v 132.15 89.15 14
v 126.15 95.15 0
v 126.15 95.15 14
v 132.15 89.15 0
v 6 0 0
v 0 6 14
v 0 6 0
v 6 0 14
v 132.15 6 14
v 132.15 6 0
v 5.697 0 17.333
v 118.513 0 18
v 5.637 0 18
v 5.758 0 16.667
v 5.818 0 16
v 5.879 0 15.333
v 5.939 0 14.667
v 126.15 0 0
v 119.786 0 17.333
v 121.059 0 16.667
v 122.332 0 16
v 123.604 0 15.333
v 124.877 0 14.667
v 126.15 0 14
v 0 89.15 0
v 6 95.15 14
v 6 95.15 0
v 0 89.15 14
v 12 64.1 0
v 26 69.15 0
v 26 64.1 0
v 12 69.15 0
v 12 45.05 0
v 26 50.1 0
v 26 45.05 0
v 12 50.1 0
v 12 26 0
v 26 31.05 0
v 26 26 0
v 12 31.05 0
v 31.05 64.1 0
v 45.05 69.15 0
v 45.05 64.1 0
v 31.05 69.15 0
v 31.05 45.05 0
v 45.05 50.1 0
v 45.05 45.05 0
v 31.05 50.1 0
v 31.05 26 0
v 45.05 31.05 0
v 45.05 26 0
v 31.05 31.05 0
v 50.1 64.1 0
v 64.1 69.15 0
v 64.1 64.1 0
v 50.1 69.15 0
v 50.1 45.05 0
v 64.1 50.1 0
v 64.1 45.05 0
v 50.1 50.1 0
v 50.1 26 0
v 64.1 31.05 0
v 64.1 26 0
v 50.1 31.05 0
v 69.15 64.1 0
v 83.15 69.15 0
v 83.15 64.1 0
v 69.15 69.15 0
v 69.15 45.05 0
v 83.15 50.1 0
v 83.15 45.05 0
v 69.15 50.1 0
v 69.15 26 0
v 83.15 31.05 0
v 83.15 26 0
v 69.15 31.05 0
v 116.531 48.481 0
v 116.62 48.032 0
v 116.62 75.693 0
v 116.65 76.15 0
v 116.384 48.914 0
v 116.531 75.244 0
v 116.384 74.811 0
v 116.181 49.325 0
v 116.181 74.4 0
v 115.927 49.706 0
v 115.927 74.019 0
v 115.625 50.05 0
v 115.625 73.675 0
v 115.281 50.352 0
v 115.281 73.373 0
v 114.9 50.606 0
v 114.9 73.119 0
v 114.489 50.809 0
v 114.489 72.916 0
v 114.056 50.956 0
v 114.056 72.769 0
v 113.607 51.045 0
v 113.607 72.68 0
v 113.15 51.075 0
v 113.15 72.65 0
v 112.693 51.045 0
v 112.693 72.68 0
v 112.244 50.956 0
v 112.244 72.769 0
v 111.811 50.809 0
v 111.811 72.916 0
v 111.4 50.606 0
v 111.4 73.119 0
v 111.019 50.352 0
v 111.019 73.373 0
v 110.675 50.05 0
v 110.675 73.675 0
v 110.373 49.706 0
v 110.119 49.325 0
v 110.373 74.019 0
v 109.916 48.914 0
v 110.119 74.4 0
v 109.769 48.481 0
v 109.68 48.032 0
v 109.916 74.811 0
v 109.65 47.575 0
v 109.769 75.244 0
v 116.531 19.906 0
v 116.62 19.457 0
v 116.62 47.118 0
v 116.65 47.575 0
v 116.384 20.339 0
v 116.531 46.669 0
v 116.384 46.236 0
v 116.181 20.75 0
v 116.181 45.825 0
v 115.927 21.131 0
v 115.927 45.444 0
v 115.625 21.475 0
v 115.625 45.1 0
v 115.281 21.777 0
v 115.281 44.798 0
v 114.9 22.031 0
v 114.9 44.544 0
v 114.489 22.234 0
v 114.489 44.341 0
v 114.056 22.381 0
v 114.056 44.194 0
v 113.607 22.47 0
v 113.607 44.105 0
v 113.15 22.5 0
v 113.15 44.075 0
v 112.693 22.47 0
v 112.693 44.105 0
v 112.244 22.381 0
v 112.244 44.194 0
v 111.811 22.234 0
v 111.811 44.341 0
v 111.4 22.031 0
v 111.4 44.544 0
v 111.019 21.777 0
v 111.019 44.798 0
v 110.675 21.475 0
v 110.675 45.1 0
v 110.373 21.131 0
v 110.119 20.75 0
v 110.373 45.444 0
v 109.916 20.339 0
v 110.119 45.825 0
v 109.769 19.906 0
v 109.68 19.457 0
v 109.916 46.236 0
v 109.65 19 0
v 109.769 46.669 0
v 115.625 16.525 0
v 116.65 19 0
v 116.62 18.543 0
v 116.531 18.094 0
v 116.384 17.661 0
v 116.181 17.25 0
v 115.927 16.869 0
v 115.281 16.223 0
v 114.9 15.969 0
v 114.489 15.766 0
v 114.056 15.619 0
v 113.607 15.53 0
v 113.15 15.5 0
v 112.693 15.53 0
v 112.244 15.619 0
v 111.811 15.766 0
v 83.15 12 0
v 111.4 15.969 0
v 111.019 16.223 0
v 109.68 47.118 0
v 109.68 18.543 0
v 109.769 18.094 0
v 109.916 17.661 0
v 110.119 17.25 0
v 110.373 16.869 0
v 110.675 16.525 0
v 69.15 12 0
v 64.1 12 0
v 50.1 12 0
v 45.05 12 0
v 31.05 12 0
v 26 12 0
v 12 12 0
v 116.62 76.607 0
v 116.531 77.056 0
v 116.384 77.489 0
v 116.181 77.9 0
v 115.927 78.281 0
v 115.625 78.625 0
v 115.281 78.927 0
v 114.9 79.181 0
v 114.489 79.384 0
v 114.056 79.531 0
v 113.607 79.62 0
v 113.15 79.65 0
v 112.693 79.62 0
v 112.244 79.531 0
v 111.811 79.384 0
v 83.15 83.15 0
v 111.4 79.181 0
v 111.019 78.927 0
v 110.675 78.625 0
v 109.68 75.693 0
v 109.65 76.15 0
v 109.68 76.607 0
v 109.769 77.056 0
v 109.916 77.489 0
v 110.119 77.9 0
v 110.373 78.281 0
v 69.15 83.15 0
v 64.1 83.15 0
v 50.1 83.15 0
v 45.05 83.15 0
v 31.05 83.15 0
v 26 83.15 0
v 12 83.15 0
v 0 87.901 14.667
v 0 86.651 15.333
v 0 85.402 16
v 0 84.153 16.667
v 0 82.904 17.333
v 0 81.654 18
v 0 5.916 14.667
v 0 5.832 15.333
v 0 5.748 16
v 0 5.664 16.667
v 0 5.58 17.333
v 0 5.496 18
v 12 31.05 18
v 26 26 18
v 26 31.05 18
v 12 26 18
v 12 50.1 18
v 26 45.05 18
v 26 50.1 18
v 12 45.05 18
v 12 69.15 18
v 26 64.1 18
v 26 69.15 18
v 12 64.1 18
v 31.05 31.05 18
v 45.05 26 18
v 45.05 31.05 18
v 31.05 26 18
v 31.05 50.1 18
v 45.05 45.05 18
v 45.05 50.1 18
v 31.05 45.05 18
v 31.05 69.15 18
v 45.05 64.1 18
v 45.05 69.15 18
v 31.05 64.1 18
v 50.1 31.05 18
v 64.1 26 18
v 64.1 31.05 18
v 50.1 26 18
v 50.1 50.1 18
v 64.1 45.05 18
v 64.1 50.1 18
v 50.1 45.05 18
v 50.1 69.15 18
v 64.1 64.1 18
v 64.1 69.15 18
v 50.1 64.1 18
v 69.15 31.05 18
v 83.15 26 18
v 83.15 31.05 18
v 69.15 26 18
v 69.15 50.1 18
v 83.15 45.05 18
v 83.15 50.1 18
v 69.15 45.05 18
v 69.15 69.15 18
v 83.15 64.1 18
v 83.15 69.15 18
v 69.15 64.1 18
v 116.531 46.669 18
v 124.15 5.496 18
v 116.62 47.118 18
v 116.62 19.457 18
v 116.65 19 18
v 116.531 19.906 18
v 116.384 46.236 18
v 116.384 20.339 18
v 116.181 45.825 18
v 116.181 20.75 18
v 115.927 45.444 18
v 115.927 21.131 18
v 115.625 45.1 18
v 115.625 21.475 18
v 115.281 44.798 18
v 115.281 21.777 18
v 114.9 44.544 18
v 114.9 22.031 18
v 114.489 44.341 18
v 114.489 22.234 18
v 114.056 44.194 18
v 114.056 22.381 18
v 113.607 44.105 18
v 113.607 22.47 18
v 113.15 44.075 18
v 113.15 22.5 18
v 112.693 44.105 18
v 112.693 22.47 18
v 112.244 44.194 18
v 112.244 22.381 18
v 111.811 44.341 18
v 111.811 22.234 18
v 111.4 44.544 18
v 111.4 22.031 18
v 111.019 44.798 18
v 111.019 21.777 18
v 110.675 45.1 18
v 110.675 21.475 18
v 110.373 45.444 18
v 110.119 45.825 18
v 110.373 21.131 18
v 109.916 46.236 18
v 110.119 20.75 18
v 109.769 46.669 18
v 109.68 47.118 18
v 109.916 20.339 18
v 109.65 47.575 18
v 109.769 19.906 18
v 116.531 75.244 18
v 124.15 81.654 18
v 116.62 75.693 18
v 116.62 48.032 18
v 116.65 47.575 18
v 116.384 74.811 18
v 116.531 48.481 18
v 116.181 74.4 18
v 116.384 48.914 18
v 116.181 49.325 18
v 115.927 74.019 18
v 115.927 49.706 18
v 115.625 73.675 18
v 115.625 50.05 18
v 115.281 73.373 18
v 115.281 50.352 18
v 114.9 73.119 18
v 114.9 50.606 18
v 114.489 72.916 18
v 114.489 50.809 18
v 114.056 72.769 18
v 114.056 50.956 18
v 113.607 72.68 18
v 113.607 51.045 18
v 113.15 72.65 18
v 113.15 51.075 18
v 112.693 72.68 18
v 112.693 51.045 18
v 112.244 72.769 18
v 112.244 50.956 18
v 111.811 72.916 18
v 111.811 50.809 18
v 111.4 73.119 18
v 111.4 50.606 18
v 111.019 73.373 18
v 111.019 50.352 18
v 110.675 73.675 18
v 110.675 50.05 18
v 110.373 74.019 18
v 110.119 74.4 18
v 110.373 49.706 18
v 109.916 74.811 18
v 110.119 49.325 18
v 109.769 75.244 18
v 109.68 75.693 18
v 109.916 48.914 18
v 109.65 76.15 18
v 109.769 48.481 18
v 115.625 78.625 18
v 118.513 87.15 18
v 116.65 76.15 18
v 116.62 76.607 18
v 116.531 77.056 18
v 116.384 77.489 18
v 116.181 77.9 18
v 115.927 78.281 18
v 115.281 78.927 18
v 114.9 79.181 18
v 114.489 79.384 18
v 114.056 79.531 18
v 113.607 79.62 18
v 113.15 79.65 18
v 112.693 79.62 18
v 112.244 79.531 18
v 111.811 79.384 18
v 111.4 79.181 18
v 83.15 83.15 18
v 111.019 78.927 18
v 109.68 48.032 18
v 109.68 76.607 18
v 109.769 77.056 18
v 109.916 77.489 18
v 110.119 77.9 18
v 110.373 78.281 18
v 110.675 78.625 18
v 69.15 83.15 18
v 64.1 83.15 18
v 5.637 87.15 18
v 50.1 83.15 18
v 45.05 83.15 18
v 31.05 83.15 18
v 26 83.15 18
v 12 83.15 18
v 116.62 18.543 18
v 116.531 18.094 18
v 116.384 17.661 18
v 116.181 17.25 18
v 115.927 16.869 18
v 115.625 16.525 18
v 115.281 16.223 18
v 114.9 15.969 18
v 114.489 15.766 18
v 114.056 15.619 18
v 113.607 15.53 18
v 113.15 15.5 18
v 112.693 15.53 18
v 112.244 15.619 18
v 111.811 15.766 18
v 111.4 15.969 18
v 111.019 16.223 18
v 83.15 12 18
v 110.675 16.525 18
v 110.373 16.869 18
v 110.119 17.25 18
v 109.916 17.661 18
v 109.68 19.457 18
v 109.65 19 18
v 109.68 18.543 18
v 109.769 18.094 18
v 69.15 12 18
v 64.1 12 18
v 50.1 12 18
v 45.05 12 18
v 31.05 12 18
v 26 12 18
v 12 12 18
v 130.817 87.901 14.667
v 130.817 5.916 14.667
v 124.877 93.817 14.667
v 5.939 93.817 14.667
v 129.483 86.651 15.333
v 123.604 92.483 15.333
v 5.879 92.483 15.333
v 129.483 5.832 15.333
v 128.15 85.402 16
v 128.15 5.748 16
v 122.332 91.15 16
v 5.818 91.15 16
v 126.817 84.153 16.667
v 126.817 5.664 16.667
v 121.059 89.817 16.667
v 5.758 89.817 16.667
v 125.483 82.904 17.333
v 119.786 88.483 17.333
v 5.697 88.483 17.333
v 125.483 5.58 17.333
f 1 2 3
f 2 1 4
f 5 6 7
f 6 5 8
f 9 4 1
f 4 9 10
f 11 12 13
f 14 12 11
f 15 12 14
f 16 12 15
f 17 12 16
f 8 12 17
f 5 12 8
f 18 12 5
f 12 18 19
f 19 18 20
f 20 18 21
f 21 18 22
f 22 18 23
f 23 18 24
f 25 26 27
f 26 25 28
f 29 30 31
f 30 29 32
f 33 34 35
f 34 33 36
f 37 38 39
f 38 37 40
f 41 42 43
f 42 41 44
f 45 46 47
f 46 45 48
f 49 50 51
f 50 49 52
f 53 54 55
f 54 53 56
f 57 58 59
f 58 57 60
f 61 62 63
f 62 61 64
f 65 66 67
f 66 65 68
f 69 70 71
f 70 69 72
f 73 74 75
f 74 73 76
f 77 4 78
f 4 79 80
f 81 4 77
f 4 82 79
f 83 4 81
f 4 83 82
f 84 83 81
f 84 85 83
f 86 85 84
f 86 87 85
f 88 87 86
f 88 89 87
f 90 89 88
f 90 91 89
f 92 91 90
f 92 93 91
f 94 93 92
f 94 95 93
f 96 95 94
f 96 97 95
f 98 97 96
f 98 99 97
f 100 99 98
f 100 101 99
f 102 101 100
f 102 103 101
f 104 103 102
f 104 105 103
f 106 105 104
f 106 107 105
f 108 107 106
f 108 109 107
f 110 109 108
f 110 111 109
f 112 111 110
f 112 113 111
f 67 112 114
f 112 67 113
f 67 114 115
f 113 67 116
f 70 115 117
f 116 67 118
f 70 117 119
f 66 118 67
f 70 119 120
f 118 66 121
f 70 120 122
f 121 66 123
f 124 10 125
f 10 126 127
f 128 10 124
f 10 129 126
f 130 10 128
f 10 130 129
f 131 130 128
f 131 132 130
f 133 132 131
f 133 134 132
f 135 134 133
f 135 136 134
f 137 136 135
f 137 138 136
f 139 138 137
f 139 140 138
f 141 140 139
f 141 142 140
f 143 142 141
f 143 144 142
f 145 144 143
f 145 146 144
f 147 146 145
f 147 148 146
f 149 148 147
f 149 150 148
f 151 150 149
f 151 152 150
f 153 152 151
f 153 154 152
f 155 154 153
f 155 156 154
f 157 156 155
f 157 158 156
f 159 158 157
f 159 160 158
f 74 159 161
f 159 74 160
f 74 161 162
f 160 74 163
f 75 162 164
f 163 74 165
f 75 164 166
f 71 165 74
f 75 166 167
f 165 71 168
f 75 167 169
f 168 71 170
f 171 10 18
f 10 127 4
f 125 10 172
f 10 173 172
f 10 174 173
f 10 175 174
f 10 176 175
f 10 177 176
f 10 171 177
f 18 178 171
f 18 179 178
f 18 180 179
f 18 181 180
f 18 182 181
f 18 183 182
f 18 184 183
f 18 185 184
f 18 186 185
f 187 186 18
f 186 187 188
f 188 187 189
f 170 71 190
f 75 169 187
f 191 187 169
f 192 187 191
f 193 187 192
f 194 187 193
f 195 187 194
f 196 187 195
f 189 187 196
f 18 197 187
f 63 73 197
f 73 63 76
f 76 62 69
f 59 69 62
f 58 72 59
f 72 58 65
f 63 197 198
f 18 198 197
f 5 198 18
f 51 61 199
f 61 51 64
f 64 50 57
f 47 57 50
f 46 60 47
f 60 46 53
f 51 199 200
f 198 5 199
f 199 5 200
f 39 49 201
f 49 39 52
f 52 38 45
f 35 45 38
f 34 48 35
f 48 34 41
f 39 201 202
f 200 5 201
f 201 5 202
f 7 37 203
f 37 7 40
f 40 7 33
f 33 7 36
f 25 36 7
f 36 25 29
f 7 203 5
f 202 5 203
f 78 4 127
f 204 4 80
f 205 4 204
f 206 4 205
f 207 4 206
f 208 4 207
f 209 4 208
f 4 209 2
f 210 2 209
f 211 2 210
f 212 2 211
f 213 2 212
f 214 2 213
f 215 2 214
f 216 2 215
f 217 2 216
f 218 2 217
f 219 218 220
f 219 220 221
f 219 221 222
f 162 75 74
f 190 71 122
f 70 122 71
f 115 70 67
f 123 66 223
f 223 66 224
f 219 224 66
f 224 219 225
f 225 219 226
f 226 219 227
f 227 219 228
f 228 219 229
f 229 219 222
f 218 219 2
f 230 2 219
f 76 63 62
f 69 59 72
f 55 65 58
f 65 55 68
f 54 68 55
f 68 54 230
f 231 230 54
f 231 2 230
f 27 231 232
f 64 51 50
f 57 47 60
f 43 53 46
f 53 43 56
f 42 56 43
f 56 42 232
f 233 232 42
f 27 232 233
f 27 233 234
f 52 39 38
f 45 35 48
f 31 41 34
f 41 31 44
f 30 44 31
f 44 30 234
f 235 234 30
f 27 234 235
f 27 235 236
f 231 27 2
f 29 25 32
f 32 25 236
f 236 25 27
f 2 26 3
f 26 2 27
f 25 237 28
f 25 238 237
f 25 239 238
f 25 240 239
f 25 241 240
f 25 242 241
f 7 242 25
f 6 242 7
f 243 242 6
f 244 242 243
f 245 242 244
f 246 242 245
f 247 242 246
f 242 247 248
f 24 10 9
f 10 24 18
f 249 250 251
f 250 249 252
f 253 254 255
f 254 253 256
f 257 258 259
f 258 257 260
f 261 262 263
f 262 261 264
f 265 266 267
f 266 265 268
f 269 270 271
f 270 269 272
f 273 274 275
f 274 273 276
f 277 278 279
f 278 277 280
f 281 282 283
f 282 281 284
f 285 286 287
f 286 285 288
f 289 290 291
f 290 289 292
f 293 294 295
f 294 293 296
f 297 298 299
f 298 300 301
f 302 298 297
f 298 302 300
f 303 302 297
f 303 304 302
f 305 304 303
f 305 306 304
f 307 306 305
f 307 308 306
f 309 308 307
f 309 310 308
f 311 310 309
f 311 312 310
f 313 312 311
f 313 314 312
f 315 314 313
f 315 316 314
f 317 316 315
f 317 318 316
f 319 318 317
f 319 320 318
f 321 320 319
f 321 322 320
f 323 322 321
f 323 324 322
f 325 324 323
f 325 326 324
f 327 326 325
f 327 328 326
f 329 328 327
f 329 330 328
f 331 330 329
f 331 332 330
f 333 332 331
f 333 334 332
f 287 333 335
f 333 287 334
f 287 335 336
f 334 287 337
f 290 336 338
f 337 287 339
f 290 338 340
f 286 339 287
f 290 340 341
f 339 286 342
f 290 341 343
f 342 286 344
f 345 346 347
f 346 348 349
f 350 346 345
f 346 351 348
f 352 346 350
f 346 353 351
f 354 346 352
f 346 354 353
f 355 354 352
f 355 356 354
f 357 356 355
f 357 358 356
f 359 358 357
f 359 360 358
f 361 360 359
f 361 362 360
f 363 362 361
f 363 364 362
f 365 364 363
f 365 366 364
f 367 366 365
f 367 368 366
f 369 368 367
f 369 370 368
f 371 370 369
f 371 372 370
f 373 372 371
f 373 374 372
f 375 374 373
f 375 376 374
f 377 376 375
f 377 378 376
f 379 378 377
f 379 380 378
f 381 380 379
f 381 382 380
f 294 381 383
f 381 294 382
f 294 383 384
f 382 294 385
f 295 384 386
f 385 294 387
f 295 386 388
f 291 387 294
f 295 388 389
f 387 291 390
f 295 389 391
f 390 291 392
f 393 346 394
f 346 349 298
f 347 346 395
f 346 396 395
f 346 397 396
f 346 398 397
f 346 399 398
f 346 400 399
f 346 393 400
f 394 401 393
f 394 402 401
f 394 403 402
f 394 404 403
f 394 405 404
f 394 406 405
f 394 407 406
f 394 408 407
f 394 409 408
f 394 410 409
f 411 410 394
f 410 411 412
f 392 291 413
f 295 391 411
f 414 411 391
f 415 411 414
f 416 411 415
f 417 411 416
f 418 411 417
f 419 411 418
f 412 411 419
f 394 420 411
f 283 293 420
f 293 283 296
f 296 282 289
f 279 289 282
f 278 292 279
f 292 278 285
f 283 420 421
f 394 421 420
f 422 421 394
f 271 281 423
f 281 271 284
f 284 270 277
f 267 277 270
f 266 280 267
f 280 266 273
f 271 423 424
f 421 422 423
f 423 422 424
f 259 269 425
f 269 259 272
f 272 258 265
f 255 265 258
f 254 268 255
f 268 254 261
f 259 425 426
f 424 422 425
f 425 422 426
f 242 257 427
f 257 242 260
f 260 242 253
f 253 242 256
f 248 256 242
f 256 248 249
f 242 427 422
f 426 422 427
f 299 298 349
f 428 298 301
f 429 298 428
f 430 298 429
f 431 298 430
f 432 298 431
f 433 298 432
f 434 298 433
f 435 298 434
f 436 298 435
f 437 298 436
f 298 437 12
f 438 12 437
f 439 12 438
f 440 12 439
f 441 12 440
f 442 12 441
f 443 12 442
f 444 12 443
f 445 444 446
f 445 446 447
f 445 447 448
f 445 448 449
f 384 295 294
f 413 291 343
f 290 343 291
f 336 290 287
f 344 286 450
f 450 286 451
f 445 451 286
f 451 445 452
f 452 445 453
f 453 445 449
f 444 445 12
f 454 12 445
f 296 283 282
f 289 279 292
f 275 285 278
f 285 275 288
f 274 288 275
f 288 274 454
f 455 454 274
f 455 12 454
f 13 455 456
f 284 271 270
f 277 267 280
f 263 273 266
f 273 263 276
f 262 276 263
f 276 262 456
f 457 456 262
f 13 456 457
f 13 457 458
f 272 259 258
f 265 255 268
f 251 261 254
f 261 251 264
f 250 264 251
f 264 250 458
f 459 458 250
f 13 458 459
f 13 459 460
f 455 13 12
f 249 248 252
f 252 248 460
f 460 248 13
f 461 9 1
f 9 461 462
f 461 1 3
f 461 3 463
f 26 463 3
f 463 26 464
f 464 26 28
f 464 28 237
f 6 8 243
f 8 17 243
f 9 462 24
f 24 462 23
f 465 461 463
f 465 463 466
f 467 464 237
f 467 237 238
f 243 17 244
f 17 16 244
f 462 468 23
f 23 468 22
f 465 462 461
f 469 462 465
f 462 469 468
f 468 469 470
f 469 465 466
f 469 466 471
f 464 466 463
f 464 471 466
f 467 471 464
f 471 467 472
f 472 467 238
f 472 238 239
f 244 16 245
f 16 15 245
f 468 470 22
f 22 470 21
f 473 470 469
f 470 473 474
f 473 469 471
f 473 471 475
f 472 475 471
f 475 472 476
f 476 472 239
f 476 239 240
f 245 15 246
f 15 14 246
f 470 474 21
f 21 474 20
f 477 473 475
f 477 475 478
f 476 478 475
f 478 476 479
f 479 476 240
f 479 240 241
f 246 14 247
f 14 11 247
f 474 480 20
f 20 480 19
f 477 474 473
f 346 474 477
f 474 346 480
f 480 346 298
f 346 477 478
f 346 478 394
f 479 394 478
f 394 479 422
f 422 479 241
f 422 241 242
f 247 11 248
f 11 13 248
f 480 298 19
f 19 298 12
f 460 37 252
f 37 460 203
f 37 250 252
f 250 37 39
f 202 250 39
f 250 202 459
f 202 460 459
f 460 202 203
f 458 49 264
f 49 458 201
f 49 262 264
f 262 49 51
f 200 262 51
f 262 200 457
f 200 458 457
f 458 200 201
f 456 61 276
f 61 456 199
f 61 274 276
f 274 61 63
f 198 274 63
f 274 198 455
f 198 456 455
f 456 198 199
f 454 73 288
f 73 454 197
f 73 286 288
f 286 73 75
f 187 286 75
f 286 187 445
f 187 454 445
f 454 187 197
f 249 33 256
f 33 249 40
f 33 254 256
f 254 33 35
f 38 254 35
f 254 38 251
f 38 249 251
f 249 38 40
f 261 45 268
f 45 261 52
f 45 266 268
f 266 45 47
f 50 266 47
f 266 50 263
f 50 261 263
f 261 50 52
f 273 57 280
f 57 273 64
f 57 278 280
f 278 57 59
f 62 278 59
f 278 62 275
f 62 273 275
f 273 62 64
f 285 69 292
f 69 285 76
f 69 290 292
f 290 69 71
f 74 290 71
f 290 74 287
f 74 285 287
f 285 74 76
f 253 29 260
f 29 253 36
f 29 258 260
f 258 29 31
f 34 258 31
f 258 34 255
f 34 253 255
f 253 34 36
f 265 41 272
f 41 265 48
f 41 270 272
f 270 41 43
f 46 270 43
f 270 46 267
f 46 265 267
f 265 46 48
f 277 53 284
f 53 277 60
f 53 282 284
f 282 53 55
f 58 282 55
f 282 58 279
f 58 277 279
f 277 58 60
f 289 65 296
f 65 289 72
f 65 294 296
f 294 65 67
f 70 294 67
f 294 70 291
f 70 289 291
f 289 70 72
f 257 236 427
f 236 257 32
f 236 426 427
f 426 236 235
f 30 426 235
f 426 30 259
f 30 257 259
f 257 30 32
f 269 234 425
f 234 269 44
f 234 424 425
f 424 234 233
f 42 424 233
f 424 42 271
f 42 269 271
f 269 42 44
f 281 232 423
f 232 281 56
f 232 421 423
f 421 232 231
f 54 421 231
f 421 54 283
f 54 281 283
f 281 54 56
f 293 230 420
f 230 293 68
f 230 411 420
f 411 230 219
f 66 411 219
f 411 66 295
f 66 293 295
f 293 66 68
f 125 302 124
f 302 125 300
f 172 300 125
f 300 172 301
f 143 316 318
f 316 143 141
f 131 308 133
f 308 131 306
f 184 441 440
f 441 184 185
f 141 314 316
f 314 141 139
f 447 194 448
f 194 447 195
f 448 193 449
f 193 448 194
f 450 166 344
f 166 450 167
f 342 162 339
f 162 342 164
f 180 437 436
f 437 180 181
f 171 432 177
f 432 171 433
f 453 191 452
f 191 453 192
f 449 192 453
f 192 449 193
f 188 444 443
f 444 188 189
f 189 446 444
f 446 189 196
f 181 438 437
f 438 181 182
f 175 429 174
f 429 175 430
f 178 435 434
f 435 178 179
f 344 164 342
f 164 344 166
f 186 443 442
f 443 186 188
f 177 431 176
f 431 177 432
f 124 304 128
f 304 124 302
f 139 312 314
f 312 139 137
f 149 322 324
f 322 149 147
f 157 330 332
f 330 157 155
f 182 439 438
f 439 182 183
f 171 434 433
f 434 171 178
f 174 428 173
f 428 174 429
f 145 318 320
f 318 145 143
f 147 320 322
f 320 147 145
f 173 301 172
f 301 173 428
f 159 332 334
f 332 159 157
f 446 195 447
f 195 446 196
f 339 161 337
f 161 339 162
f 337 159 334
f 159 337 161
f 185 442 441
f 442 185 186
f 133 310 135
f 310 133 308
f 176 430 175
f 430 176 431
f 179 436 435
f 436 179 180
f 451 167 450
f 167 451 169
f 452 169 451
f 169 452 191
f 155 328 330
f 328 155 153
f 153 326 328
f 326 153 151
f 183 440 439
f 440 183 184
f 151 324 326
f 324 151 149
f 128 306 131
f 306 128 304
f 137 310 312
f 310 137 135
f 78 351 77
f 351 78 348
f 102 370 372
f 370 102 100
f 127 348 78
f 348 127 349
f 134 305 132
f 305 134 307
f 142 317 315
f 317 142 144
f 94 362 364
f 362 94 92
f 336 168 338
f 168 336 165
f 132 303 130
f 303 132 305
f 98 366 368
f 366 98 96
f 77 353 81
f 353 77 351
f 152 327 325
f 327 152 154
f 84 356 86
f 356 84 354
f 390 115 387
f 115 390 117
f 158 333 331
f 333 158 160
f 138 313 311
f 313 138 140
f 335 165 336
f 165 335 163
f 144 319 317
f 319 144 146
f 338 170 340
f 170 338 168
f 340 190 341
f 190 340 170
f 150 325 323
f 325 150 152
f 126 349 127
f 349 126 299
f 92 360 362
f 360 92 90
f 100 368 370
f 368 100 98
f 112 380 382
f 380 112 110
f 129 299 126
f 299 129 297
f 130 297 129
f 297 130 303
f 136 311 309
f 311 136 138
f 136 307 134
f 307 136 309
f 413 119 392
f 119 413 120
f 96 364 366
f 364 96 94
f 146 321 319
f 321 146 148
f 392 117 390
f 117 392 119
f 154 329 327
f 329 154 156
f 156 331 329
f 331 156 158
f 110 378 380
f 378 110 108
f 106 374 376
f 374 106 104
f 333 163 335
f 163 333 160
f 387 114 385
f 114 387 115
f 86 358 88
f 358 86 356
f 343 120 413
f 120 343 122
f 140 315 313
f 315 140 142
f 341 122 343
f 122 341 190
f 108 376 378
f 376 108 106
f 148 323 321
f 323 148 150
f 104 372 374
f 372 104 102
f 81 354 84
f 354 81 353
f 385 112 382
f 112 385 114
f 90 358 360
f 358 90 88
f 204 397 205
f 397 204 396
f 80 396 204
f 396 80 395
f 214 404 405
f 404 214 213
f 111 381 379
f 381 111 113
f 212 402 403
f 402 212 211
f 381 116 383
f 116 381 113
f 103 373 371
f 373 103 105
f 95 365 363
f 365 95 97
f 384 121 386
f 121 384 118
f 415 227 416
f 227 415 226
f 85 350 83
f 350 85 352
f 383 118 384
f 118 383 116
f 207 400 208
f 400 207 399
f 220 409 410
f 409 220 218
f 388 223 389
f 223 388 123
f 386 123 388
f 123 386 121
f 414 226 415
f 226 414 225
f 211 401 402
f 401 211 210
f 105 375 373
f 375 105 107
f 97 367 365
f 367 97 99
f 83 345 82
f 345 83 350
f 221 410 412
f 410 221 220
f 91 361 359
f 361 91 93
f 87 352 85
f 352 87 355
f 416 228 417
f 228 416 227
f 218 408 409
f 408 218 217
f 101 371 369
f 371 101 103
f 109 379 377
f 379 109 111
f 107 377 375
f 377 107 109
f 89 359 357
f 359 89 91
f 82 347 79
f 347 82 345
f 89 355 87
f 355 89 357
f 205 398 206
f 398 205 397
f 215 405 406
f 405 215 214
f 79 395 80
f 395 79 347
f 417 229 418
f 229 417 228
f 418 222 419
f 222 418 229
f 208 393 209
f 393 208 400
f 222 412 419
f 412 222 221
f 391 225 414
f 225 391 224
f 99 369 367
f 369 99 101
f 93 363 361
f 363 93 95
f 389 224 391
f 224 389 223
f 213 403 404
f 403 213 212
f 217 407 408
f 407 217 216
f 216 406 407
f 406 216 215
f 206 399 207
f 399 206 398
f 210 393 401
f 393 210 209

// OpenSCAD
// Stream Deck Macro — top plate v3
// Outer shell style inspired by "MisteRdeck / Ocreeb DIY Macro Keypad"
// (printables.com) — rebuilt as fresh parametric geometry (not scaled from
// their mesh) so the corner chamfer / edge bevel stays a clean, uniform
// angle instead of distorting under non-uniform stretching.

// ---- Our target layout ----
switch_hole   = 14;
switch_pitch  = 19.05;
grid_cols     = 4;
grid_rows     = 4;
grid_span     = (grid_cols - 1) * switch_pitch + switch_hole; // 71.15

encoder_d     = 7;       // placeholder — confirm with calipers before printing final
encoder_count = 3;
encoder_gap   = 30;

margin = 12;

// ---- Shell style ----
corner_chamfer = 6;   // diagonal cut on each of the 4 corners
body_height    = 14;  // main straight wall height
bevel_height   = 4;   // top tapered collar height
bevel_inset    = 4;   // how far the top face is inset from the outer wall

plate_w = margin*2 + grid_span + encoder_gap + encoder_d;
plate_d = margin*2 + grid_span;

module chamfered_rect(w, d, c) {
    polygon(points = [
        [c, 0], [w - c, 0],
        [w, c], [w, d - c],
        [w - c, d], [c, d],
        [0, d - c], [0, c]
    ]);
}

module shell() {
    // straight body
    linear_extrude(height = body_height)
        chamfered_rect(plate_w, plate_d, corner_chamfer);
    // tapered top collar (the "angular smoothing" edge)
    translate([0, 0, body_height])
        linear_extrude(height = bevel_height,
                       scale = [(plate_w - 2*bevel_inset) / plate_w,
                                (plate_d - 2*bevel_inset) / plate_d])
            chamfered_rect(plate_w, plate_d, corner_chamfer);
}

module new_switch_grid(origin_x, origin_y) {
    for (row = [0 : grid_rows - 1])
        for (col = [0 : grid_cols - 1])
            translate([origin_x + col*switch_pitch, origin_y + row*switch_pitch, -2])
                linear_extrude(height = body_height + bevel_height + 4)
                    square(switch_hole, center = true);
}

module new_encoder_column(origin_x, origin_y, grid_height) {
    spacing = grid_height / (encoder_count - 1);
    for (i = [0 : encoder_count - 1])
        translate([origin_x, origin_y + i*spacing, -2])
            linear_extrude(height = body_height + bevel_height + 4)
                circle(d = encoder_d, $fn = 48);
}

grid_origin_x = margin + switch_hole/2;
grid_origin_y = margin + switch_hole/2;
grid_height_span = (grid_rows - 1) * switch_pitch;
encoder_x = grid_origin_x + (grid_cols - 1)*switch_pitch + switch_hole/2 + encoder_gap;

difference() {
    shell();
    new_switch_grid(grid_origin_x, grid_origin_y);
    new_encoder_column(encoder_x, grid_origin_y, grid_height_span);
}
